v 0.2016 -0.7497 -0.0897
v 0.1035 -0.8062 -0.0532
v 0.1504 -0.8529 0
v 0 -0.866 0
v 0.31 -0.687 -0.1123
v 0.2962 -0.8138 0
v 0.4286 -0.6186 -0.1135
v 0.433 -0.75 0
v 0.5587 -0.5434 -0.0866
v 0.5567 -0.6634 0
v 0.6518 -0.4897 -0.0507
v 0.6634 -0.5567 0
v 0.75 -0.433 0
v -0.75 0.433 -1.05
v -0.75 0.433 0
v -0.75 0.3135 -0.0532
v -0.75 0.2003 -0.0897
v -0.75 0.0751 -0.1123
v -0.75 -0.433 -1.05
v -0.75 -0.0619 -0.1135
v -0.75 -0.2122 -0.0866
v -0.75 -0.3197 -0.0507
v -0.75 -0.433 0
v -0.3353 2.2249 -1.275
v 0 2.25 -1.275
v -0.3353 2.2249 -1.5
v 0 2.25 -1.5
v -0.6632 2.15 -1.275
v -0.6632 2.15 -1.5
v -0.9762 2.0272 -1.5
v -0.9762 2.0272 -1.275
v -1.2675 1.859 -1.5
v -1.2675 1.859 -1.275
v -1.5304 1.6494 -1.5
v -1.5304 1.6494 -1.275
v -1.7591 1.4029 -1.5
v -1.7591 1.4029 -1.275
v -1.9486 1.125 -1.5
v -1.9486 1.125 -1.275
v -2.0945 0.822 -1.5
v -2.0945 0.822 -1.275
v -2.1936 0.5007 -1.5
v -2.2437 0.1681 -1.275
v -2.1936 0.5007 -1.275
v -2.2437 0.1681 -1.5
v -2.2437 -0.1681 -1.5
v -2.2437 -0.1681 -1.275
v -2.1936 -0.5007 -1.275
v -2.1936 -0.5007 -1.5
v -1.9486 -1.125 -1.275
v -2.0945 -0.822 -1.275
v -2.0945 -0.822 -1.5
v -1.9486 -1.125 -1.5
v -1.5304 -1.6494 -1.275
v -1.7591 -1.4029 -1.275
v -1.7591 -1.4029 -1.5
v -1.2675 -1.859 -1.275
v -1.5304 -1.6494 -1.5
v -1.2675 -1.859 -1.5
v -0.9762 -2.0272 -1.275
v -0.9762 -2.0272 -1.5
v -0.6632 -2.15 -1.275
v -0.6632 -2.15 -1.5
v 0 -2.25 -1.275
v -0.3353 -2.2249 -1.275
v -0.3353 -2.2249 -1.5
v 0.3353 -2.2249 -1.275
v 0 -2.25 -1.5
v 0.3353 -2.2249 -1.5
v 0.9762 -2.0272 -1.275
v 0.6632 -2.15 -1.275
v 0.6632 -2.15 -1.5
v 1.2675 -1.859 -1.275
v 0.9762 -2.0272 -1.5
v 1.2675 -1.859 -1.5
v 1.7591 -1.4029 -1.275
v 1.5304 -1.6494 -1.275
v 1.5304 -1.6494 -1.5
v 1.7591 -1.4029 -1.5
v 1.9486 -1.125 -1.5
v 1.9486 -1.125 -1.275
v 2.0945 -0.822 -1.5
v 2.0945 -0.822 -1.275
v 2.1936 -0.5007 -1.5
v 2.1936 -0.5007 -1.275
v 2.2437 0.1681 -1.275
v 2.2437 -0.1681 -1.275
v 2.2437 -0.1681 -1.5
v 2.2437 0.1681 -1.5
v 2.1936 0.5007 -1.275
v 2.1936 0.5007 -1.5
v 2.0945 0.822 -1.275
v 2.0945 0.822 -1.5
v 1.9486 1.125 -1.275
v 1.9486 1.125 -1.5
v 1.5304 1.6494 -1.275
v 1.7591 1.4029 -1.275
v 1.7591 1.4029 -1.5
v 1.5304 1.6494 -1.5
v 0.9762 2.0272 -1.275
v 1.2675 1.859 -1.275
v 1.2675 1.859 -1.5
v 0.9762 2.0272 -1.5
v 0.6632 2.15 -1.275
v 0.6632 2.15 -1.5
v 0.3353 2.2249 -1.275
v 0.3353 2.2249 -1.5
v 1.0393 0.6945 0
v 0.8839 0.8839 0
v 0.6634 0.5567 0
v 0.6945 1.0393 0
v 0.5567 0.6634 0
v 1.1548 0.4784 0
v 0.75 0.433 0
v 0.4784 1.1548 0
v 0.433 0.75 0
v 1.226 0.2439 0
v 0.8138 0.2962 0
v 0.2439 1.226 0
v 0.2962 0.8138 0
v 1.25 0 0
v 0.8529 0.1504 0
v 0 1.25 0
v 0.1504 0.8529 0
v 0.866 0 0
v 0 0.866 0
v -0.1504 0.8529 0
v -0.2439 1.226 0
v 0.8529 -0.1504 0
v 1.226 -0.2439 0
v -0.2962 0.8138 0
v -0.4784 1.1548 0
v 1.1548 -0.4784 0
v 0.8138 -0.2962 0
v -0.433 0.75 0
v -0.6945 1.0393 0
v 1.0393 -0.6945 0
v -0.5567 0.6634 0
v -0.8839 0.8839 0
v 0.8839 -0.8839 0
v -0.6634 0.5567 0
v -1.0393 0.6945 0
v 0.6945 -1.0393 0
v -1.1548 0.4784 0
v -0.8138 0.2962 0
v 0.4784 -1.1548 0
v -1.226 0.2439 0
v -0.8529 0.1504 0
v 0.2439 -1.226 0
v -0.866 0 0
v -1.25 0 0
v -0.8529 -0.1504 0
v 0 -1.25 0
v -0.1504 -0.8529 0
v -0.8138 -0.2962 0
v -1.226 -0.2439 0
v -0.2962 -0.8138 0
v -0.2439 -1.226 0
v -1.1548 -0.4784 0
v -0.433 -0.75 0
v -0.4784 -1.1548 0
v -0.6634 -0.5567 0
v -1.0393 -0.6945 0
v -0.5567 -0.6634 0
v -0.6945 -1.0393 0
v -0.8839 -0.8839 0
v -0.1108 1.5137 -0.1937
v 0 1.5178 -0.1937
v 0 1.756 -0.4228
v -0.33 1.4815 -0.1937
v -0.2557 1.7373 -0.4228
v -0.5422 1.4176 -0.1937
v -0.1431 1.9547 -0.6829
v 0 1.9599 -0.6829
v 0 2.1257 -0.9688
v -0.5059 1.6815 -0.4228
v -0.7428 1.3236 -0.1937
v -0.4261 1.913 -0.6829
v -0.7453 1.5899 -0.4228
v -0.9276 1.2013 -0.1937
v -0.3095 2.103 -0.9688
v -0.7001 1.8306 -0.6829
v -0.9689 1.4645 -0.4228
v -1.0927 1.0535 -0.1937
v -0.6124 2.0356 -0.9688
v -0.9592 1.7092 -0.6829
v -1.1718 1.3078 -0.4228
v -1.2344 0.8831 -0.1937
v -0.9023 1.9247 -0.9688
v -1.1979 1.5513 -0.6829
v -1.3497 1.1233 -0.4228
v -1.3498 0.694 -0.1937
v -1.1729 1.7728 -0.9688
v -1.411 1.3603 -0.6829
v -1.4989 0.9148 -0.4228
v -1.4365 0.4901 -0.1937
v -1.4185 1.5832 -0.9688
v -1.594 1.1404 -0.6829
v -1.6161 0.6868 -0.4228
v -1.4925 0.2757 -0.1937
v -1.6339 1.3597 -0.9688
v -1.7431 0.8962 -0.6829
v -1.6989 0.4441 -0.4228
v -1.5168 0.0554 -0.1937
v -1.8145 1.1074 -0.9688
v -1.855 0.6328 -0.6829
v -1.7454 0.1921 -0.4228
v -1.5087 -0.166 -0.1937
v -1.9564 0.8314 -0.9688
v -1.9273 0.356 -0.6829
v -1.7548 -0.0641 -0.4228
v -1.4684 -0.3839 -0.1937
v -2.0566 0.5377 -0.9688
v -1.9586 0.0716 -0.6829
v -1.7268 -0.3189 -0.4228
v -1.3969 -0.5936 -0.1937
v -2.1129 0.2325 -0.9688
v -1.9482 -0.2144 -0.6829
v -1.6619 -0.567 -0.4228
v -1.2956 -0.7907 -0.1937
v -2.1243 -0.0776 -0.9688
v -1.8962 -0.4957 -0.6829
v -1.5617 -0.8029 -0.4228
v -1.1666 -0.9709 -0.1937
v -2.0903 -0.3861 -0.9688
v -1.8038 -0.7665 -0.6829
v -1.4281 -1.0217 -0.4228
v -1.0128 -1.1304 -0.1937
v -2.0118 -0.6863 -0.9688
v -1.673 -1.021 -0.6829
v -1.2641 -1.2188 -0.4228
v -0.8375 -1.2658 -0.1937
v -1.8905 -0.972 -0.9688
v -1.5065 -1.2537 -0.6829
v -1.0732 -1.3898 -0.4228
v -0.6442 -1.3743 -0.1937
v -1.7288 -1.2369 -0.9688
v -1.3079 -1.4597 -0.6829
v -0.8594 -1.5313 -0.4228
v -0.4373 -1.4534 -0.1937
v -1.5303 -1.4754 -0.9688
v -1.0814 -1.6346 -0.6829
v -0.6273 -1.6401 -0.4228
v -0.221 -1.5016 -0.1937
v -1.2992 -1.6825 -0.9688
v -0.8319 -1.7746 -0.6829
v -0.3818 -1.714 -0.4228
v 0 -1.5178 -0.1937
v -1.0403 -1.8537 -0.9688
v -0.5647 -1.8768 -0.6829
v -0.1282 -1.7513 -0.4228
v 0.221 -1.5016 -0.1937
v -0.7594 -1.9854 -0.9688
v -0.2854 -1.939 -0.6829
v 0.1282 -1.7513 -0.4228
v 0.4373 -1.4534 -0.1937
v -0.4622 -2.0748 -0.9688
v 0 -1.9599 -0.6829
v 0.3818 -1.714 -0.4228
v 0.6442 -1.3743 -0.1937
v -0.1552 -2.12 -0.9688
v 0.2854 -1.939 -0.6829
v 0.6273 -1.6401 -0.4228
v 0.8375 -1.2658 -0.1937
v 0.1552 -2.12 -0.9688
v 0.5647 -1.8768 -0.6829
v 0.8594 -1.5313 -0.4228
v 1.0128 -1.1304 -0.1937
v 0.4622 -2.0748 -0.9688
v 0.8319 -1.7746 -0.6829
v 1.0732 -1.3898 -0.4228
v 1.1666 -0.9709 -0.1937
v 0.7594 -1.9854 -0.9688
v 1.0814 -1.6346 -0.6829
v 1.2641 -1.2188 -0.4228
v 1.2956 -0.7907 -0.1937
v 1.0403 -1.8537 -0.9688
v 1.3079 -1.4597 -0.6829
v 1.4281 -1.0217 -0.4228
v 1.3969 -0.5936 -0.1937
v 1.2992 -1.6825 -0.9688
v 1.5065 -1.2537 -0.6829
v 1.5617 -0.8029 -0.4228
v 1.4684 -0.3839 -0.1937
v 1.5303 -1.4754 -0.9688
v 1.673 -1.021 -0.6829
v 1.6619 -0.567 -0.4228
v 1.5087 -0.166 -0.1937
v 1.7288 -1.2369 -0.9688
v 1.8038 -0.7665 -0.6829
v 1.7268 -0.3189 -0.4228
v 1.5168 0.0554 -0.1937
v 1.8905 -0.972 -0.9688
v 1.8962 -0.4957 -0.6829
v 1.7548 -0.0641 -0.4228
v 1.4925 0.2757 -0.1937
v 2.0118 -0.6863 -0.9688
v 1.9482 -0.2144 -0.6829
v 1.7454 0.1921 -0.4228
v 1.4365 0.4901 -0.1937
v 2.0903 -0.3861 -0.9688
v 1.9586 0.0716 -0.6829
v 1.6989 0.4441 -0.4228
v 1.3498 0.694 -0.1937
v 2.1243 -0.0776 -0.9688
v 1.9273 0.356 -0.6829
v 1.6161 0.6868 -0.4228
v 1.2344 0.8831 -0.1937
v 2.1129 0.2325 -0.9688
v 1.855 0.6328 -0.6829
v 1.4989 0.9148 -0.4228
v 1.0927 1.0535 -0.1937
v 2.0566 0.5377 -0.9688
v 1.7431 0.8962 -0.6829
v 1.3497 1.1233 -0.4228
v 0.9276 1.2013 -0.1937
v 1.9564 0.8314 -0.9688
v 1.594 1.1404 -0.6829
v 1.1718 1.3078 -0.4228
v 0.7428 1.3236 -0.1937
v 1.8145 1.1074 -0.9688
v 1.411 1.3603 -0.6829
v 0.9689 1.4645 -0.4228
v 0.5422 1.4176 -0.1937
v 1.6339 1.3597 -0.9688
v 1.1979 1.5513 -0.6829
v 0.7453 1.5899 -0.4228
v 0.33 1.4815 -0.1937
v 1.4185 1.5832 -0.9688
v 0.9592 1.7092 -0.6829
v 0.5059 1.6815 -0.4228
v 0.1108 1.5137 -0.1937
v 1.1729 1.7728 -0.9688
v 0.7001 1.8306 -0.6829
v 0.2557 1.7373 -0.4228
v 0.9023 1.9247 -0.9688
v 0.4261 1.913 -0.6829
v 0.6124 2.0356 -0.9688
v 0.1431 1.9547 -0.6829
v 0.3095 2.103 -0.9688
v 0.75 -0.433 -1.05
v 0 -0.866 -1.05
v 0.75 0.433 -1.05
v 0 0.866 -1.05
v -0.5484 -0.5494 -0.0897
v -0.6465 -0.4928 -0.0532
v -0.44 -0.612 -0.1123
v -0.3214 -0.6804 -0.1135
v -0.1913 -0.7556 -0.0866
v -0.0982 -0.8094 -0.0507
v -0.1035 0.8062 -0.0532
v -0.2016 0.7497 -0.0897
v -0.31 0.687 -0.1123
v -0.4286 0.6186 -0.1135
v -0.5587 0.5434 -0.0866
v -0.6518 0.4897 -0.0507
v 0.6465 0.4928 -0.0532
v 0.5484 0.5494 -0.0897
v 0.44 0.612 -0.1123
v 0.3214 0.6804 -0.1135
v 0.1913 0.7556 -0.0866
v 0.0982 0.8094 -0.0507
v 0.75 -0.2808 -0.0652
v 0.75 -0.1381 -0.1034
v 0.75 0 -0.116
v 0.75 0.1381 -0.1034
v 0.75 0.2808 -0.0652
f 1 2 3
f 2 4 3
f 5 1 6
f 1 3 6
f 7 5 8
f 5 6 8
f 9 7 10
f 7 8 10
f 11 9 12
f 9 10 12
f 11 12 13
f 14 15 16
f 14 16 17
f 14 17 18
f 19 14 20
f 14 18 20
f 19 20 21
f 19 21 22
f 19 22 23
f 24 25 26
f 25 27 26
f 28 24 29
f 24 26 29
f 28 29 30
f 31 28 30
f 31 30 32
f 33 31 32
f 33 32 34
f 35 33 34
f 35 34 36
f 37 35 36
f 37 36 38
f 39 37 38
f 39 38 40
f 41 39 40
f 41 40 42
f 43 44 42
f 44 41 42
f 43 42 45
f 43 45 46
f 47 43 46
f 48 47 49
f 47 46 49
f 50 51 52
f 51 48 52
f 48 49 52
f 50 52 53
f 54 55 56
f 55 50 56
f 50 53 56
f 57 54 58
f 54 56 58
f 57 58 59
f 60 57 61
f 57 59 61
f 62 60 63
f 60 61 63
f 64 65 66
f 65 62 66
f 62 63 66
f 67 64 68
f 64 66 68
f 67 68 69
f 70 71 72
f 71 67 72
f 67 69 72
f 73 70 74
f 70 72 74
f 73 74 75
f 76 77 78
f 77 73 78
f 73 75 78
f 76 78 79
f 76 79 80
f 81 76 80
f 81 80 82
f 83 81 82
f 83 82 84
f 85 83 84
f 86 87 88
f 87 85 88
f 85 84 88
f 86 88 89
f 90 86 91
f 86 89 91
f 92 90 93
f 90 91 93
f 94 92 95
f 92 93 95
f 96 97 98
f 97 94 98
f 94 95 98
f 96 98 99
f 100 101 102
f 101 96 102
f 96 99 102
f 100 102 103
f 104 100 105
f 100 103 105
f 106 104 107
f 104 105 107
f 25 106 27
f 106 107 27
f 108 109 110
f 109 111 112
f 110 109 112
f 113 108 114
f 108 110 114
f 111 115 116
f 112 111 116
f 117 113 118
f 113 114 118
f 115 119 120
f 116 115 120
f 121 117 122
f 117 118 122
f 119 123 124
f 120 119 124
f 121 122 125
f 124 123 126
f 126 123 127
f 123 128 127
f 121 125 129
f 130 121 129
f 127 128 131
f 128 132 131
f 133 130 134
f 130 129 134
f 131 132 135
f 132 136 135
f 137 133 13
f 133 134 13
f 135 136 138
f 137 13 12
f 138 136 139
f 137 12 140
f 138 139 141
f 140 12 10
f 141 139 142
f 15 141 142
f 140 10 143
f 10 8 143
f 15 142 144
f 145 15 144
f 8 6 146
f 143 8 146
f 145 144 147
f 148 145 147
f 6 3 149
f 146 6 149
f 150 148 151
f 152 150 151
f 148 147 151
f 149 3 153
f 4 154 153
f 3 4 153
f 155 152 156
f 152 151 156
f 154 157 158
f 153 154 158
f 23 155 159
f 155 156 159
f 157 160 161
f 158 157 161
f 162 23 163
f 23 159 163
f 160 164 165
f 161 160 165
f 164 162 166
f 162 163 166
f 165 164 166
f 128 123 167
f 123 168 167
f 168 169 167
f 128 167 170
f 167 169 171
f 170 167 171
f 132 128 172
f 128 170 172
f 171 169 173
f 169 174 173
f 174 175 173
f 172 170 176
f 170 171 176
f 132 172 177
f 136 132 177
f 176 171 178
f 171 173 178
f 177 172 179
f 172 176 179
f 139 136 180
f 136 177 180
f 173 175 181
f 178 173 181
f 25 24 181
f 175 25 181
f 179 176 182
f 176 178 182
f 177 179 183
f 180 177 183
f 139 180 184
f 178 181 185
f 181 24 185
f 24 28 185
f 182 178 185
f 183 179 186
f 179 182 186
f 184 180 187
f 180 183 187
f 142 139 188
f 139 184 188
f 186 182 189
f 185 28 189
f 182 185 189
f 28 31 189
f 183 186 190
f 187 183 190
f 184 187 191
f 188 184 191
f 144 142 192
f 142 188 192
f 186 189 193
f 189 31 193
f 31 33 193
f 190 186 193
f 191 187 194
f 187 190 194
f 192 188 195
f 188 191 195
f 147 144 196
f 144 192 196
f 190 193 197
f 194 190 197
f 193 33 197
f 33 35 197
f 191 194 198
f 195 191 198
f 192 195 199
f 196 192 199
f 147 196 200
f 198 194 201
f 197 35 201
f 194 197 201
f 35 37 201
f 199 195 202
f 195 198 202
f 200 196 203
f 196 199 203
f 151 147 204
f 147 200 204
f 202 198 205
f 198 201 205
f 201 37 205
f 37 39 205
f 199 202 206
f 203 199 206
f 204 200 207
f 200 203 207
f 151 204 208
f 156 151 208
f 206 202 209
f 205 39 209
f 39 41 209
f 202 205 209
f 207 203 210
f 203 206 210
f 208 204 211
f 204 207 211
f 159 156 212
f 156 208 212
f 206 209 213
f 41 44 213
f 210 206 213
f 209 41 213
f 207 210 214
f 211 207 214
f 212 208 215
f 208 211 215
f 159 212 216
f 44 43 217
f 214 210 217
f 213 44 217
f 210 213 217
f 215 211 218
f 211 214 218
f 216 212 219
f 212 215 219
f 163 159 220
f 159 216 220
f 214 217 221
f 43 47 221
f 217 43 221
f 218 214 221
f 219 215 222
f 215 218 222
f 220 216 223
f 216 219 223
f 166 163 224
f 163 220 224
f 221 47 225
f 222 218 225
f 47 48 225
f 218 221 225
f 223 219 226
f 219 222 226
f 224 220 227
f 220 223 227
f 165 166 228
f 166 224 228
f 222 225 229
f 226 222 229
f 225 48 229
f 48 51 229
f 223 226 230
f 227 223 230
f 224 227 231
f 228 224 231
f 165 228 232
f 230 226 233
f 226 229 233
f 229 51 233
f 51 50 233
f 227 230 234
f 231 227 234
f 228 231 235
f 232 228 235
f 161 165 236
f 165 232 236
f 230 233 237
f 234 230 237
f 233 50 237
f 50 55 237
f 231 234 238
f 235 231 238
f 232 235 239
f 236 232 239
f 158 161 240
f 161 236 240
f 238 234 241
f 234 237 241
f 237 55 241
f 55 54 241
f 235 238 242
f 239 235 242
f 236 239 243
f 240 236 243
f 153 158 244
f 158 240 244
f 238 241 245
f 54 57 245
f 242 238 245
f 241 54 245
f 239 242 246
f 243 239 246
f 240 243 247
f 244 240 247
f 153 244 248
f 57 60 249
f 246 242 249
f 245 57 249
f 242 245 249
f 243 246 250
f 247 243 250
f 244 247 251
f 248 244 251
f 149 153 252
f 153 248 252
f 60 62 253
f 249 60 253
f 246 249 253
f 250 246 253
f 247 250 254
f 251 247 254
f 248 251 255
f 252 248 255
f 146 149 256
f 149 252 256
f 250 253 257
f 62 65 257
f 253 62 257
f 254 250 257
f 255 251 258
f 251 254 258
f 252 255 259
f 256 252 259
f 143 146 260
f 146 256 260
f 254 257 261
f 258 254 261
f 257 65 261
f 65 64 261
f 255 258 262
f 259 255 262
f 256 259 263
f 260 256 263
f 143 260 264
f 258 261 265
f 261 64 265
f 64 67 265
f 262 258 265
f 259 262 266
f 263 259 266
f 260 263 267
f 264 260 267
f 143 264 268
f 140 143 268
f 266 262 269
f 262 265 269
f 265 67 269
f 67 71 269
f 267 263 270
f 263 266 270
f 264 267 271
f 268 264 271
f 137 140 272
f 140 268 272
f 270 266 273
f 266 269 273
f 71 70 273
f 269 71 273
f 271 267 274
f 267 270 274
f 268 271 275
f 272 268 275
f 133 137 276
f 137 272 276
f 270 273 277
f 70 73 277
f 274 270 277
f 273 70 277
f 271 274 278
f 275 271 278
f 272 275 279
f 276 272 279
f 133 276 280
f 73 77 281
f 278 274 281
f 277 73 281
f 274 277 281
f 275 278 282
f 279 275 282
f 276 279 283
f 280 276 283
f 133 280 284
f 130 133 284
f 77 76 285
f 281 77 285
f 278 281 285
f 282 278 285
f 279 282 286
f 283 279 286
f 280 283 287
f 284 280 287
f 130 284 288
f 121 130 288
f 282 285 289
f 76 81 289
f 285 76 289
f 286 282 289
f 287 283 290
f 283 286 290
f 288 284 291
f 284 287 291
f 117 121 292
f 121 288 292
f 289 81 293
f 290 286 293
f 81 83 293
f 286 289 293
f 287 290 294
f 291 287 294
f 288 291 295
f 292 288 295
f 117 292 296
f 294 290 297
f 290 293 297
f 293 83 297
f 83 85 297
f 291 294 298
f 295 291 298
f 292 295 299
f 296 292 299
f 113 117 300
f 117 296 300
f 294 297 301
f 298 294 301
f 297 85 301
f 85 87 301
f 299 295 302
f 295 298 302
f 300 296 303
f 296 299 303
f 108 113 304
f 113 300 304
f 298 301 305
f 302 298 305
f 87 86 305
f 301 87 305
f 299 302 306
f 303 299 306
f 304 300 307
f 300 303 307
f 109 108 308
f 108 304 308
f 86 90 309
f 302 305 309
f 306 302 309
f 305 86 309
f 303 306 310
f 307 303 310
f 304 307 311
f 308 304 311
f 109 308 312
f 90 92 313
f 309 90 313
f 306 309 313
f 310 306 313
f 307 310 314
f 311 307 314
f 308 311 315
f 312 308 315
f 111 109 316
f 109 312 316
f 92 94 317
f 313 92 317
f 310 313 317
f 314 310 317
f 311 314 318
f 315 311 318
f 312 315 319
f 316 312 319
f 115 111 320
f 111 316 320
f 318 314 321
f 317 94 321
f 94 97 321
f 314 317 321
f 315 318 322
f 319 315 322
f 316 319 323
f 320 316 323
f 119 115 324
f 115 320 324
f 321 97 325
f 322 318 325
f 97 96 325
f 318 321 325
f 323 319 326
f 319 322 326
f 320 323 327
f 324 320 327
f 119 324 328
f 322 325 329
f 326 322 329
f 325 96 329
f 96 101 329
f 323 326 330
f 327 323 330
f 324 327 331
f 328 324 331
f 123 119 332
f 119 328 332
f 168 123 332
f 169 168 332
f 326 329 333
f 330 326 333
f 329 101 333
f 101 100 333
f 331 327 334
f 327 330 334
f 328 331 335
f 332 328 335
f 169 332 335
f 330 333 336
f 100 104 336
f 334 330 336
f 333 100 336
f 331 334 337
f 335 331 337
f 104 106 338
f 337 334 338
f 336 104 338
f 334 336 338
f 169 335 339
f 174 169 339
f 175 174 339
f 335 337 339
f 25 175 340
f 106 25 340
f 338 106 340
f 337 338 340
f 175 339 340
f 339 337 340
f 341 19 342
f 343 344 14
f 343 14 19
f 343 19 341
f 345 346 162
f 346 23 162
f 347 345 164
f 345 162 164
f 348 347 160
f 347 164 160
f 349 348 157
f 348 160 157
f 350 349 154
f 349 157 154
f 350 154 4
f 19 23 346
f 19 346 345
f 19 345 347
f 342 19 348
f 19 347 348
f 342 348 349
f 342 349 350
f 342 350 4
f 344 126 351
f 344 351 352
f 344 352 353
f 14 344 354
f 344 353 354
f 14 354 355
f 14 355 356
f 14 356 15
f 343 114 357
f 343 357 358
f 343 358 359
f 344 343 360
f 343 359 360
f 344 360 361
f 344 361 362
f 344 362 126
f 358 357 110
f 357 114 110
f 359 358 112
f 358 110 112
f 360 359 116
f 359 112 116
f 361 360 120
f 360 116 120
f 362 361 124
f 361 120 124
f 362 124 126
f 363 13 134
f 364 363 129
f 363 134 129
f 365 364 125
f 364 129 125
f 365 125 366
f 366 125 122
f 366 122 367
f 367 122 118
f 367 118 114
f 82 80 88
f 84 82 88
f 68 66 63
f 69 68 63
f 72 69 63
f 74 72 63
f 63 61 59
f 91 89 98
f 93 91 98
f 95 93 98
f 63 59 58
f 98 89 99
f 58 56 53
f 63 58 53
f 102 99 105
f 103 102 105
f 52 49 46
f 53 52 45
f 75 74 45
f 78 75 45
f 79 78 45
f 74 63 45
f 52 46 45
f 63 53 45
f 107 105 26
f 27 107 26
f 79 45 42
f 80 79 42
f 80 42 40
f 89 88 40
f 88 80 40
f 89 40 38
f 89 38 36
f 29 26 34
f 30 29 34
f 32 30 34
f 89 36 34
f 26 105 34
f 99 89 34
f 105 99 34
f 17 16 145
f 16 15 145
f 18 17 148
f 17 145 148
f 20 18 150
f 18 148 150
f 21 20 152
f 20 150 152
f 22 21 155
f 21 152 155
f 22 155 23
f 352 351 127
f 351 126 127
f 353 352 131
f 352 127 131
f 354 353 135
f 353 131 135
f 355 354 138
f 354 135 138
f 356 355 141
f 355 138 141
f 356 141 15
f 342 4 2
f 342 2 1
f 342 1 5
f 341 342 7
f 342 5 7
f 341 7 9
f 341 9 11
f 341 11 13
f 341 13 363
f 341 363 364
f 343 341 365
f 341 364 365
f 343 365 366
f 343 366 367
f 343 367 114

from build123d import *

# Parameters (mm, degrees)
REVOLVE2_ANGLE     = 360
CUT_EXTRUDE2_DEPTH = 1.05
SKETCH6_R          = 0.866025404
CUT_EXTRUDE3_DEPTH = 1.05
CUT_EXTRUDE3_DRAFT = -45


with BuildPart() as part:
    # Sketch7 → Revolve2 (revolve, symmetric)
    with BuildSketch(Plane(origin=(0, 0, 0), x_dir=(0, 0, -1), z_dir=(1, 0, 0))) as revolve2_sk:
        with BuildLine():
            Line((1.275, 2.25), (1.5, 2.25))
            Line((1.5, 2.25), (1.5, 0))
            Line((1.5, 0), (0, 0))
            Line((0, 0), (0, 1.25))
            ThreePointArc((0, 1.25), (0.549264706, 1.8625), (1.275, 2.25))
        make_face()
    revolve(axis=Axis((0, 0, 0), (0, 0, -1)), revolution_arc=REVOLVE2_ANGLE / 2)
    revolve(revolve2_sk.sketch, axis=Axis((0, 0, 0), (0, 0, 1)), revolution_arc=REVOLVE2_ANGLE / 2)

    # Sketch5 → Cut-Extrude2 (cut)
    with BuildSketch(Plane.XY):
        Polygon((0.75, -0.433012702), (0.75, 0.433012702), (0, 0.866025404), (-0.75, 0.433012702), (-0.75, -0.433012702), (0, -0.866025404), align=None)
    extrude(amount=-CUT_EXTRUDE2_DEPTH, mode=Mode.SUBTRACT)


with BuildPart() as cut_extrude3_tool:
    # Sketch6 → Cut-Extrude3 (with draft: the straight prism first)
    with BuildSketch(Plane.XY):
        Circle(SKETCH6_R)
    extrude(amount=-CUT_EXTRUDE3_DEPTH)
    # Cut-Extrude3: the draft: its side faces are tilted about the plane it starts from
    cut_extrude3_sides = [cut_extrude3_tool.faces().sort_by_distance(p)[0] for p in [
        (-0.866025404, 0, -0.525),
    ]]
    draft(cut_extrude3_sides, Plane.XY, CUT_EXTRUDE3_DRAFT)


with BuildPart() as part_1:
    add(part.part)

    # Cut-Extrude3: cut by cut_extrude3_tool
    add(cut_extrude3_tool.part, mode=Mode.SUBTRACT)


solid = part_1.part
